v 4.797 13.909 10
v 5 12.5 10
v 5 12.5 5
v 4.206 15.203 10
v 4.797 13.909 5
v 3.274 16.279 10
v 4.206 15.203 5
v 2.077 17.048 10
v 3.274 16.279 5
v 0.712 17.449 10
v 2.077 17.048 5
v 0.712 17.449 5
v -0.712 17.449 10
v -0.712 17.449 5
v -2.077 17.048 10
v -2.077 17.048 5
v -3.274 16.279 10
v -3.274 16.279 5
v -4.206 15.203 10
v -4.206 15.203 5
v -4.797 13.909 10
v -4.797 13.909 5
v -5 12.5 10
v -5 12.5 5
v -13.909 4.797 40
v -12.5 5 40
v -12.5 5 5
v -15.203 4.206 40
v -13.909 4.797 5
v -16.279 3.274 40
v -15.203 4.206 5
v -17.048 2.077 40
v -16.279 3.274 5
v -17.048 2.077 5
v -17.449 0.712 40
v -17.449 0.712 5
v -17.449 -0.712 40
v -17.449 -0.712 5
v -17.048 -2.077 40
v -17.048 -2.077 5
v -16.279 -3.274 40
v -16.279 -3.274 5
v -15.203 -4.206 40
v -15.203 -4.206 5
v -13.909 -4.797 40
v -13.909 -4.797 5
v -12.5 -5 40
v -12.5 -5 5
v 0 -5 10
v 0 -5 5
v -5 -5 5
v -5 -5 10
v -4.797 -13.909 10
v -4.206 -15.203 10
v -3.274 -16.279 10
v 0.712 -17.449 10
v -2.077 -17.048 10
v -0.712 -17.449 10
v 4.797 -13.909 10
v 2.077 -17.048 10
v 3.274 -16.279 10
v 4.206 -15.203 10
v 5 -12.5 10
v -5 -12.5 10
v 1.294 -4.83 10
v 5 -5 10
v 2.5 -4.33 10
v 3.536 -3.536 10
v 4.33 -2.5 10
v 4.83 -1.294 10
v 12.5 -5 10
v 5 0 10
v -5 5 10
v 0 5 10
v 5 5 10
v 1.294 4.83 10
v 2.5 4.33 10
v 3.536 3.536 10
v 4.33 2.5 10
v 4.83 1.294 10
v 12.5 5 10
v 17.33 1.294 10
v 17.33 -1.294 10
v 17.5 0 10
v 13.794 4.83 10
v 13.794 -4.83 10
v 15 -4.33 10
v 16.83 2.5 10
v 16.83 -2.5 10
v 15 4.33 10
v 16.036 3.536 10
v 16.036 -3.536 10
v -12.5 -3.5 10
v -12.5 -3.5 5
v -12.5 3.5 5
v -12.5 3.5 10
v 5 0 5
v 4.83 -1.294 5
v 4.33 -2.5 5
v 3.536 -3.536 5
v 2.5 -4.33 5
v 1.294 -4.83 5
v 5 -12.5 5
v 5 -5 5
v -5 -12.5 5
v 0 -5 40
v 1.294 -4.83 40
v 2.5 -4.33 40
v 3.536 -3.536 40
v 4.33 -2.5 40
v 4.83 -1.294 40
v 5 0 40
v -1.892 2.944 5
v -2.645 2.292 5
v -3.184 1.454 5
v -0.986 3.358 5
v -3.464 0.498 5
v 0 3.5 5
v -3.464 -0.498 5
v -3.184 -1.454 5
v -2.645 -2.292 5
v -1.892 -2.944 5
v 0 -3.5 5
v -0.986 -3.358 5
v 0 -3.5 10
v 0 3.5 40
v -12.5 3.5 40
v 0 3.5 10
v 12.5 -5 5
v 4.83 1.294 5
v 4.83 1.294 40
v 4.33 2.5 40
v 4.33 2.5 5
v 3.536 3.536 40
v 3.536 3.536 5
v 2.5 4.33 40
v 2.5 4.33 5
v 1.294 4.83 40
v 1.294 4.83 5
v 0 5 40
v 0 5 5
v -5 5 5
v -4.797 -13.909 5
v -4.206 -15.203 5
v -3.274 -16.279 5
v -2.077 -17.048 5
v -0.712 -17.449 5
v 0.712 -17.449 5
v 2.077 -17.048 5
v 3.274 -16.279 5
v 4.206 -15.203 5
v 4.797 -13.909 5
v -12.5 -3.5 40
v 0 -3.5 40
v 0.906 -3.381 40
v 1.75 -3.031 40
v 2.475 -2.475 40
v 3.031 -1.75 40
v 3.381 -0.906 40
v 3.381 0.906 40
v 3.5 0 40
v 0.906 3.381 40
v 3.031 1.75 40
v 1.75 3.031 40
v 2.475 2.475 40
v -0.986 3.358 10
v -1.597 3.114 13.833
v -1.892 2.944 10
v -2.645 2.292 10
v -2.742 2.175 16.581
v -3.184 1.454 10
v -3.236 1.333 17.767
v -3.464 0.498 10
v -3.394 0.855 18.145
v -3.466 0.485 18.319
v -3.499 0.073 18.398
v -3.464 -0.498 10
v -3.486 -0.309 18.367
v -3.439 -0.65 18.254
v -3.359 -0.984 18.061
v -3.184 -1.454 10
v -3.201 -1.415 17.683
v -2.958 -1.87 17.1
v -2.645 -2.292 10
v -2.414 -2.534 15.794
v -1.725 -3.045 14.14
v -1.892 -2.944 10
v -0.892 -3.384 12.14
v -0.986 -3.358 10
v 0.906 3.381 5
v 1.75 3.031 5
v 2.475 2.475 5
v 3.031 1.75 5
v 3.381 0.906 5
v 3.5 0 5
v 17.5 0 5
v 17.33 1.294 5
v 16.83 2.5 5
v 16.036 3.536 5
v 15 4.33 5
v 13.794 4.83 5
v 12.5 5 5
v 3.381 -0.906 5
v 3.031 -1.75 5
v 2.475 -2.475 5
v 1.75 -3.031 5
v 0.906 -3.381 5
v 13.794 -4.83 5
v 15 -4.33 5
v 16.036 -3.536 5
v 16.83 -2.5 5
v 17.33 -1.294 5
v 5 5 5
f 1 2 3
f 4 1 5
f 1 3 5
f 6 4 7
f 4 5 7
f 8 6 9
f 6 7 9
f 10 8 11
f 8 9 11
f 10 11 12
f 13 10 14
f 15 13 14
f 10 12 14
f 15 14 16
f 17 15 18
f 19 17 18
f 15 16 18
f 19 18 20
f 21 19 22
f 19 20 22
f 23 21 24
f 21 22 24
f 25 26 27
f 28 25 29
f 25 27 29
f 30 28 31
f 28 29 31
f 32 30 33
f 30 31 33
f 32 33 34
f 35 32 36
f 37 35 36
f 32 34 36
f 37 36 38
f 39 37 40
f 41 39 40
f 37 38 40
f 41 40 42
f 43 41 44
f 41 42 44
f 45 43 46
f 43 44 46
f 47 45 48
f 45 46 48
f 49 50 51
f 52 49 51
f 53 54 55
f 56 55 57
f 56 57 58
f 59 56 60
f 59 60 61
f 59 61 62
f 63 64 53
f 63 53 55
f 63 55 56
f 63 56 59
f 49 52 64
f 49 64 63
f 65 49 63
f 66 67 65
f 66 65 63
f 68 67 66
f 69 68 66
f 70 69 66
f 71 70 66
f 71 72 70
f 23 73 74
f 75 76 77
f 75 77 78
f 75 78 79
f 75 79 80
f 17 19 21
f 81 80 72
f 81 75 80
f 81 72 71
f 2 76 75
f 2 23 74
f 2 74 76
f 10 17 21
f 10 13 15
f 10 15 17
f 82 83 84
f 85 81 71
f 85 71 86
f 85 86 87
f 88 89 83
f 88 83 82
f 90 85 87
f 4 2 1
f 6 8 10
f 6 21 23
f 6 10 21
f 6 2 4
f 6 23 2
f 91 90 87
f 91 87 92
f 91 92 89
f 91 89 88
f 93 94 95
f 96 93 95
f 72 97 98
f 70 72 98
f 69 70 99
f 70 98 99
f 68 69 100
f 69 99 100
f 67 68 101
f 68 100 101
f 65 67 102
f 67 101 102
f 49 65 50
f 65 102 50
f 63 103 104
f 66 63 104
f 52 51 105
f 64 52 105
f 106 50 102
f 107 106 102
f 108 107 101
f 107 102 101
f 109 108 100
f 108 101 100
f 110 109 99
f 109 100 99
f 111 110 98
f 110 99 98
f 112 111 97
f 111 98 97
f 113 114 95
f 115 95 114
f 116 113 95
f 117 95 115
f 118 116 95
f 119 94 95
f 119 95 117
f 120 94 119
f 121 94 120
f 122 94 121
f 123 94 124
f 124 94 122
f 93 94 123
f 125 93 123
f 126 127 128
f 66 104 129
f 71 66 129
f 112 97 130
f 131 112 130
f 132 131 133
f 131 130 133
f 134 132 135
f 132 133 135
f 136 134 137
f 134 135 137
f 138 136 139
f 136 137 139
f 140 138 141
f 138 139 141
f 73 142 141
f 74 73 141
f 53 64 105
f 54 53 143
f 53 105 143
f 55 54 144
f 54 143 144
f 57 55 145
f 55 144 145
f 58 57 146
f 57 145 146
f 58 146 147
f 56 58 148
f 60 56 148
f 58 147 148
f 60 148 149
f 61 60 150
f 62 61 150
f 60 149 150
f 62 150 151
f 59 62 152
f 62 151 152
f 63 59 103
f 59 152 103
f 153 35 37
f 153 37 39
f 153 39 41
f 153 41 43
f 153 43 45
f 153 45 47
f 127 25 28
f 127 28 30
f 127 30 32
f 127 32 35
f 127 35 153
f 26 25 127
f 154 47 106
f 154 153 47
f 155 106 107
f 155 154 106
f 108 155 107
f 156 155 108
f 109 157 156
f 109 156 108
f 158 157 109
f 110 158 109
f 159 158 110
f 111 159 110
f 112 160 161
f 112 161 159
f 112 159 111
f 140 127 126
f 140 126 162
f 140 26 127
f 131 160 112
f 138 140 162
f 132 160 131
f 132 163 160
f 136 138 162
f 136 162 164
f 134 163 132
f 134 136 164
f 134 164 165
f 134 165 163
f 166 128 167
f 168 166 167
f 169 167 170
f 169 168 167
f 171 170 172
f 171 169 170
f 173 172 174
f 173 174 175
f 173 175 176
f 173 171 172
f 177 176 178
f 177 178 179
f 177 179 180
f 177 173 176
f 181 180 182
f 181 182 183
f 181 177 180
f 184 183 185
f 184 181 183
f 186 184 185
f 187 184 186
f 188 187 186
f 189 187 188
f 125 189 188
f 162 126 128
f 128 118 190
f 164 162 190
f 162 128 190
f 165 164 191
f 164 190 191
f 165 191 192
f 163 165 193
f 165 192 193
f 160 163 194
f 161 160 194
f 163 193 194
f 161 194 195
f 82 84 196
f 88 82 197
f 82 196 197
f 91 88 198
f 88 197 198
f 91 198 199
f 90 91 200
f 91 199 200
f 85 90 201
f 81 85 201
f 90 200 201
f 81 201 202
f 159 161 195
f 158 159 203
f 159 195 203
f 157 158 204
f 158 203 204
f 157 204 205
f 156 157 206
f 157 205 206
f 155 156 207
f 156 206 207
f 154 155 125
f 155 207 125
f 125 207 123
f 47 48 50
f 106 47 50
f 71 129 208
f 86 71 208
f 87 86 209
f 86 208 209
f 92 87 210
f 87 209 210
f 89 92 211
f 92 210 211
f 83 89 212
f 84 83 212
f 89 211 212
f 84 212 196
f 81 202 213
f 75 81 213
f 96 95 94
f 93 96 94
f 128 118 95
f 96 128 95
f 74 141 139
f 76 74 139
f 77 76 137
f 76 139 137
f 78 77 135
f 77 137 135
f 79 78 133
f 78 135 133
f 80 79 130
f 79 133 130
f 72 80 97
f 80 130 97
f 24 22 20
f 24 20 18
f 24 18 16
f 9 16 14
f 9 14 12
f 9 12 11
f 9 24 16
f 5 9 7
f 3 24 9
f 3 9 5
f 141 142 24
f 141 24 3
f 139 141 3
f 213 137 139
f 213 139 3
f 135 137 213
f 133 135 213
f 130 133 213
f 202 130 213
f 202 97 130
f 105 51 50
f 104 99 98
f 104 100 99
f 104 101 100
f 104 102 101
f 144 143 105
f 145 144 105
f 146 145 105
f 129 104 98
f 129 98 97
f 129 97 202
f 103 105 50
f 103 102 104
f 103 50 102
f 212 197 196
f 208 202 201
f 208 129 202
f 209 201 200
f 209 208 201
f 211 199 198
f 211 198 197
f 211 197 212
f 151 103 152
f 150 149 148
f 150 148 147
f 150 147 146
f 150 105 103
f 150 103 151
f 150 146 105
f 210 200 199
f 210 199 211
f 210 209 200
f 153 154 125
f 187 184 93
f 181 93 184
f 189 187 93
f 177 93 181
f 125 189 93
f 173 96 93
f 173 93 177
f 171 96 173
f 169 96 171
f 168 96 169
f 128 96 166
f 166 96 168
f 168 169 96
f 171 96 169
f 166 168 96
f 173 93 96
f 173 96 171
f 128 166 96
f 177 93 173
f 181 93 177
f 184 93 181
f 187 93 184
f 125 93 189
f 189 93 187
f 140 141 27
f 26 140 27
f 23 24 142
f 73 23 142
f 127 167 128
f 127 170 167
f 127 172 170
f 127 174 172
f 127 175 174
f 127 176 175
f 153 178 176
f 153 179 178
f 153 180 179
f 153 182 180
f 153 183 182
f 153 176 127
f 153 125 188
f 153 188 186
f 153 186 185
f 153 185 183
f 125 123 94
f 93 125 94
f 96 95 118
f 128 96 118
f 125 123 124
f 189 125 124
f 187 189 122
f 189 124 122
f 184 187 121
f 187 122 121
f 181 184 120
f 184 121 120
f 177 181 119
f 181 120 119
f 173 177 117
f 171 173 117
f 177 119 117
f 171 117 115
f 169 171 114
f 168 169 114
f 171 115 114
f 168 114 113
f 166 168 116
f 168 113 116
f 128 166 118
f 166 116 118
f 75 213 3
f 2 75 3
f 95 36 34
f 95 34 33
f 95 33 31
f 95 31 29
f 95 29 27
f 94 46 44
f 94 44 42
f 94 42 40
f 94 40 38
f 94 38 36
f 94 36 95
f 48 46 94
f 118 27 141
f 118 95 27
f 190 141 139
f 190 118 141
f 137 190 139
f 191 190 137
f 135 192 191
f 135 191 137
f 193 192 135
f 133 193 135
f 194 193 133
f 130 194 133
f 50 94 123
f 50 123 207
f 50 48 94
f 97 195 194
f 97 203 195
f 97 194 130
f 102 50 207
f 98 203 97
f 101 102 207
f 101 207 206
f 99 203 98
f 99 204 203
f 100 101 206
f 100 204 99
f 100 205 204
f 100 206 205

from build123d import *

# Parameters (mm, degrees)
F2_DEPTH  = 5
F3_DEPTH  = 40
F4_DEPTH  = 10
F5_DEPTH  = 40
F9_DEPTH  = 3
F10_SIZE  = 2
F12_DEPTH = 20


# Not quite as in the source:
# - a feature of the source that left no trace in its solid (it failed there, or was rolled back) is left out


with BuildPart() as f2:
    # F1 (on Front) → F2 (new body, symmetric)
    with BuildSketch(Plane.XZ):
        Polygon((-12.5, 10), (0, 10), (-12.5, 40), align=None)
    extrude(amount=F2_DEPTH, both=True)

    # F0 (on Top) → F3 (join)
    with BuildSketch(Plane.XY):
        with BuildLine():
            ThreePointArc((0, -5), (3.5355339059, -3.5355339059), (5, 0))
            ThreePointArc((5, 0), (3.5355339059, 3.5355339059), (0, 5))
            Line((0, 5), (0, 3.5))
            ThreePointArc((0, 3.5), (2.4748737342, 2.4748737342), (3.5, 0))
            ThreePointArc((3.5, 0), (2.4748737342, -2.4748737342), (0, -3.5))
            Line((0, -3.5), (0, -5))
        make_face()
        with BuildLine():
            Line((0, 3.5), (0, 5))
            ThreePointArc((0, 5), (-1.9364916731, 4.6097722286), (-3.5707142143, 3.5))
            Line((-3.5707142143, 3.5), (0, 3.5))
        make_face()
        with BuildLine():
            ThreePointArc((-3.5707142143, 3.5), (-1.9364916731, 4.6097722286), (0, 5))
            Line((0, 5), (-5, 5))
            Line((-5, 5), (-5, 3.5))
            Line((-5, 3.5), (-3.5707142143, 3.5))
        make_face()
        with BuildLine():
            Line((-5, 3.5), (-5, 5))
            Line((-5, 5), (-11.4564392374, 5))
            ThreePointArc((-11.4564392374, 5), (-11.4783307541, 4.9495376652), (-11.5, 4.8989794856))
            ThreePointArc((-11.5, 4.8989794856), (-10.1099910027, 4.3917942794), (-8.9292857857, 3.5))
            Line((-8.9292857857, 3.5), (-5, 3.5))
        make_face()
        with BuildLine():
            Line((-12, 3.5), (-8.9292857857, 3.5))
            ThreePointArc((-8.9292857857, 3.5), (-10.1099910027, 4.3917942794), (-11.5, 4.8989794856))
            ThreePointArc((-11.5, 4.8989794856), (-11.7708022624, 4.2069245417), (-12, 3.5))
        make_face()
        with BuildLine():
            ThreePointArc((-12, 3.5), (-11.7708022624, 4.2069245417), (-11.5, 4.8989794856))
            ThreePointArc((-11.5, 4.8989794856), (-11.99745519, 4.974680765), (-12.5, 5))
            Line((-12.5, 5), (-12.5, 3.5))
            Line((-12.5, 3.5), (-12, 3.5))
        make_face()
        with BuildLine():
            ThreePointArc((-12.5, -5), (-11.99745519, -4.974680765), (-11.5, -4.8989794856))
            ThreePointArc((-11.5, -4.8989794856), (-11.7708022624, -4.2069245417), (-12, -3.5))
            Line((-12, -3.5), (-12.5, -3.5))
            Line((-12.5, -3.5), (-12.5, -5))
        make_face()
        with BuildLine():
            ThreePointArc((-11.5, -4.8989794856), (-10.1099910027, -4.3917942794), (-8.9292857857, -3.5))
            Line((-8.9292857857, -3.5), (-12, -3.5))
            ThreePointArc((-12, -3.5), (-11.7708022624, -4.2069245417), (-11.5, -4.8989794856))
        make_face()
        with BuildLine():
            Line((-11.4564392374, -5), (-5, -5))
            Line((-5, -5), (-5, -3.5))
            Line((-5, -3.5), (-8.9292857857, -3.5))
            ThreePointArc((-8.9292857857, -3.5), (-10.1099910027, -4.3917942794), (-11.5, -4.8989794856))
            ThreePointArc((-11.5, -4.8989794856), (-11.4783307541, -4.9495376652), (-11.4564392374, -5))
        make_face()
        with BuildLine():
            Line((-5, -5), (0, -5))
            ThreePointArc((0, -5), (-1.9364916731, -4.6097722286), (-3.5707142143, -3.5))
            Line((-3.5707142143, -3.5), (-5, -3.5))
            Line((-5, -3.5), (-5, -5))
        make_face()
        with BuildLine():
            ThreePointArc((-3.5707142143, -3.5), (-1.9364916731, -4.6097722286), (0, -5))
            Line((0, -5), (0, -3.5))
            Line((0, -3.5), (-3.5707142143, -3.5))
        make_face()
        with BuildLine():
            Line((-12.5, -5), (-11.4564392374, -5))
            ThreePointArc((-11.4564392374, -5), (-11.4783307541, -4.9495376652), (-11.5, -4.8989794856))
            ThreePointArc((-11.5, -4.8989794856), (-11.99745519, -4.974680765), (-12.5, -5))
        make_face()
        with BuildLine():
            ThreePointArc((-11.5, 4.8989794856), (-11.4783307541, 4.9495376652), (-11.4564392374, 5))
            Line((-11.4564392374, 5), (-12.5, 5))
            ThreePointArc((-12.5, 5), (-11.99745519, 4.974680765), (-11.5, 4.8989794856))
        make_face()
        with BuildLine():
            Line((-12.5, 0), (-12.5, 3))
            ThreePointArc((-12.5, 3), (-15.5, 0), (-12.5, -3))
            Line((-12.5, -3), (-12.5, 0))
        make_face()
        with BuildLine():
            Line((-12.5, 3.5), (-12.5, 5))
            ThreePointArc((-12.5, 5), (-17.5, 0), (-12.5, -5))
            Line((-12.5, -5), (-12.5, -3.5))
            Line((-12.5, -3.5), (-12.5, -3))
            ThreePointArc((-12.5, -3), (-15.5, 0), (-12.5, 3))
            Line((-12.5, 3), (-12.5, 3.5))
        make_face()
    extrude(amount=F3_DEPTH)

    # F0 (on Top) → F5 (cut)
    with BuildSketch(Plane.XY):
        with BuildLine():
            ThreePointArc((3.5, 0), (2.4748737342, 2.4748737342), (0, 3.5))
            ThreePointArc((0, 3.5), (-3.5, 0), (0, -3.5))
            ThreePointArc((0, -3.5), (2.4748737342, -2.4748737342), (3.5, 0))
        make_face()
    extrude(amount=F5_DEPTH, mode=Mode.SUBTRACT)


with BuildPart() as f4:
    # F0 (on Top) → F4 (new body)
    with BuildSketch(Plane.XY):
        with BuildLine():
            Line((0, 3.5), (-3.5707142143, 3.5))
            ThreePointArc((-3.5707142143, 3.5), (-4.6289075964, 1.8902948088), (-5, 0))
            ThreePointArc((-5, 0), (-4.6289075964, -1.8902948088), (-3.5707142143, -3.5))
            Line((-3.5707142143, -3.5), (0, -3.5))
            ThreePointArc((0, -3.5), (-3.5, 0), (0, 3.5))
        make_face()
        with BuildLine():
            ThreePointArc((-5, 0), (-4.6289075964, 1.8902948088), (-3.5707142143, 3.5))
            Line((-3.5707142143, 3.5), (-5, 3.5))
            Line((-5, 3.5), (-5, 0))
        make_face()
        with BuildLine():
            Line((-5, -3.5), (-3.5707142143, -3.5))
            ThreePointArc((-3.5707142143, -3.5), (-4.6289075964, -1.8902948088), (-5, 0))
            Line((-5, 0), (-5, -3.5))
        make_face()
        with BuildLine():
            Line((-5, -3.5), (-5, 0))
            Line((-5, 0), (-5, 3.5))
            Line((-5, 3.5), (-8.9292857857, 3.5))
            ThreePointArc((-8.9292857857, 3.5), (-7.8710924036, 1.8902948088), (-7.5, 0))
            ThreePointArc((-7.5, 0), (-7.8710924036, -1.8902948088), (-8.9292857857, -3.5))
            Line((-8.9292857857, -3.5), (-5, -3.5))
        make_face()
        with BuildLine():
            ThreePointArc((-7.5, 0), (-7.8710924036, 1.8902948088), (-8.9292857857, 3.5))
            Line((-8.9292857857, 3.5), (-12, 3.5))
            ThreePointArc((-12, 3.5), (-12.072818108, 3.239917118), (-12.14, 2.978321675))
            ThreePointArc((-12.14, 2.978321675), (-10.2550055679, 1.9899748742), (-9.5, 0))
            ThreePointArc((-9.5, 0), (-10.2550055679, -1.9899748742), (-12.14, -2.978321675))
            ThreePointArc((-12.14, -2.978321675), (-12.072818108, -3.239917118), (-12, -3.5))
            Line((-12, -3.5), (-8.9292857857, -3.5))
            ThreePointArc((-8.9292857857, -3.5), (-7.8710924036, -1.8902948088), (-7.5, 0))
        make_face()
        with BuildLine():
            ThreePointArc((-9.5, 0), (-10.2550055679, 1.9899748742), (-12.14, 2.978321675))
            ThreePointArc((-12.14, 2.978321675), (-12.409673646, 1.5), (-12.5, 0))
            ThreePointArc((-12.5, 0), (-12.409673646, -1.5), (-12.14, -2.978321675))
            ThreePointArc((-12.14, -2.978321675), (-10.2550055679, -1.9899748742), (-9.5, 0))
        make_face()
        with BuildLine():
            ThreePointArc((-12.5, 0), (-12.409673646, 1.5), (-12.14, 2.978321675))
            ThreePointArc((-12.14, 2.978321675), (-12.3196739413, 2.9945755146), (-12.5, 3))
            Line((-12.5, 3), (-12.5, 0))
        make_face()
        with BuildLine():
            ThreePointArc((-12.5, -3), (-12.3196739413, -2.9945755146), (-12.14, -2.978321675))
            ThreePointArc((-12.14, -2.978321675), (-12.409673646, -1.5), (-12.5, 0))
            Line((-12.5, 0), (-12.5, -3))
        make_face()
        with BuildLine():
            Line((-12.5, -3.5), (-12, -3.5))
            ThreePointArc((-12, -3.5), (-12.072818108, -3.239917118), (-12.14, -2.978321675))
            ThreePointArc((-12.14, -2.978321675), (-12.3196739413, -2.9945755146), (-12.5, -3))
            Line((-12.5, -3), (-12.5, -3.5))
        make_face()
        with BuildLine():
            ThreePointArc((-12.14, 2.978321675), (-12.072818108, 3.239917118), (-12, 3.5))
            Line((-12, 3.5), (-12.5, 3.5))
            Line((-12.5, 3.5), (-12.5, 3))
            ThreePointArc((-12.5, 3), (-12.3196739413, 2.9945755146), (-12.14, 2.978321675))
        make_face()
    extrude(amount=F4_DEPTH)


with BuildPart() as f4b:
    # F0 (on Top) → F4, piece 2 (new body)
    with BuildSketch(Plane.XY):
        with BuildLine():
            Line((5, 5), (5, 11.4564392374))
            ThreePointArc((5, 11.4564392374), (4.9495376652, 11.4783307541), (4.8989794856, 11.5))
            ThreePointArc((4.8989794856, 11.5), (0, 7.5), (-4.8989794856, 11.5))
            ThreePointArc((-4.8989794856, 11.5), (-4.9495376652, 11.4783307541), (-5, 11.4564392374))
            Line((-5, 11.4564392374), (-5, 5))
            Line((-5, 5), (0, 5))
            Line((0, 5), (5, 5))
        make_face()
        with BuildLine():
            ThreePointArc((-4.8989794856, 11.5), (0, 7.5), (4.8989794856, 11.5))
            ThreePointArc((4.8989794856, 11.5), (3.9516285749, 11.8589473229), (2.978321675, 12.14))
            ThreePointArc((2.978321675, 12.14), (0, 9.5), (-2.978321675, 12.14))
            ThreePointArc((-2.978321675, 12.14), (-3.9516285749, 11.8589473229), (-4.8989794856, 11.5))
        make_face()
        with BuildLine():
            ThreePointArc((-2.978321675, 12.14), (0, 9.5), (2.978321675, 12.14))
            ThreePointArc((2.978321675, 12.14), (1.5, 12.409673646), (0, 12.5))
            ThreePointArc((0, 12.5), (-1.5, 12.409673646), (-2.978321675, 12.14))
        make_face()
        with BuildLine():
            ThreePointArc((0, 12.5), (1.5, 12.409673646), (2.978321675, 12.14))
            ThreePointArc((2.978321675, 12.14), (2.9945755146, 12.3196739413), (3, 12.5))
            Line((3, 12.5), (0, 12.5))
        make_face()
        with BuildLine():
            ThreePointArc((2.978321675, 12.14), (3.9516285749, 11.8589473229), (4.8989794856, 11.5))
            ThreePointArc((4.8989794856, 11.5), (4.974680765, 11.99745519), (5, 12.5))
            Line((5, 12.5), (3, 12.5))
            ThreePointArc((3, 12.5), (2.9945755146, 12.3196739413), (2.978321675, 12.14))
        make_face()
        with BuildLine():
            Line((3, 12.5), (5, 12.5))
            ThreePointArc((5, 12.5), (0, 17.5), (-5, 12.5))
            Line((-5, 12.5), (-3, 12.5))
            ThreePointArc((-3, 12.5), (0, 15.5), (3, 12.5))
        make_face()
        with BuildLine():
            Line((0, 12.5), (3, 12.5))
            ThreePointArc((3, 12.5), (0, 15.5), (-3, 12.5))
            Line((-3, 12.5), (0, 12.5))
        make_face()
        with BuildLine():
            ThreePointArc((-2.978321675, 12.14), (-1.5, 12.409673646), (0, 12.5))
            Line((0, 12.5), (-3, 12.5))
            ThreePointArc((-3, 12.5), (-2.9945755146, 12.3196739413), (-2.978321675, 12.14))
        make_face()
        with BuildLine():
            ThreePointArc((-5, 12.5), (-4.974680765, 11.99745519), (-4.8989794856, 11.5))
            ThreePointArc((-4.8989794856, 11.5), (-3.9516285749, 11.8589473229), (-2.978321675, 12.14))
            ThreePointArc((-2.978321675, 12.14), (-2.9945755146, 12.3196739413), (-3, 12.5))
            Line((-3, 12.5), (-5, 12.5))
        make_face()
        with BuildLine():
            ThreePointArc((12.14, -2.978321675), (9.5, 0), (12.14, 2.978321675))
            ThreePointArc((12.14, 2.978321675), (11.8589473229, 3.9516285749), (11.5, 4.8989794856))
            ThreePointArc((11.5, 4.8989794856), (7.5, 0), (11.5, -4.8989794856))
            ThreePointArc((11.5, -4.8989794856), (11.8589473229, -3.9516285749), (12.14, -2.978321675))
        make_face()
        with BuildLine():
            ThreePointArc((11.5, 4.8989794856), (11.8589473229, 3.9516285749), (12.14, 2.978321675))
            ThreePointArc((12.14, 2.978321675), (12.3196739413, 2.9945755146), (12.5, 3))
            Line((12.5, 3), (12.5, 5))
            ThreePointArc((12.5, 5), (11.99745519, 4.974680765), (11.5, 4.8989794856))
        make_face()
        with BuildLine():
            Line((12.5, 5), (12.5, 3))
            ThreePointArc((12.5, 3), (14.6213203436, 2.1213203436), (15.5, 0))
            ThreePointArc((15.5, 0), (14.6213203436, -2.1213203436), (12.5, -3))
            Line((12.5, -3), (12.5, -5))
            ThreePointArc((12.5, -5), (16.0355339059, -3.5355339059), (17.5, 0))
            ThreePointArc((17.5, 0), (16.0355339059, 3.5355339059), (12.5, 5))
        make_face()
        with BuildLine():
            Line((12.5, 3), (12.5, 0))
            Line((12.5, 0), (12.5, -3))
            ThreePointArc((12.5, -3), (14.6213203436, -2.1213203436), (15.5, 0))
            ThreePointArc((15.5, 0), (14.6213203436, 2.1213203436), (12.5, 3))
        make_face()
        with BuildLine():
            ThreePointArc((12.14, -2.978321675), (12.409673646, -1.5), (12.5, 0))
            ThreePointArc((12.5, 0), (12.409673646, 1.5), (12.14, 2.978321675))
            ThreePointArc((12.14, 2.978321675), (9.5, 0), (12.14, -2.978321675))
        make_face()
        with BuildLine():
            ThreePointArc((12.14, 2.978321675), (12.409673646, 1.5), (12.5, 0))
            Line((12.5, 0), (12.5, 3))
            ThreePointArc((12.5, 3), (12.3196739413, 2.9945755146), (12.14, 2.978321675))
        make_face()
        with BuildLine():
            Line((12.5, -3), (12.5, 0))
            ThreePointArc((12.5, 0), (12.409673646, -1.5), (12.14, -2.978321675))
            ThreePointArc((12.14, -2.978321675), (12.3196739413, -2.9945755146), (12.5, -3))
        make_face()
        with BuildLine():
            ThreePointArc((12.5, -3), (12.3196739413, -2.9945755146), (12.14, -2.978321675))
            ThreePointArc((12.14, -2.978321675), (11.8589473229, -3.9516285749), (11.5, -4.8989794856))
            ThreePointArc((11.5, -4.8989794856), (11.99745519, -4.974680765), (12.5, -5))
            Line((12.5, -5), (12.5, -3))
        make_face()
        with BuildLine():
            ThreePointArc((11.5, -4.8989794856), (7.5, 0), (11.5, 4.8989794856))
            ThreePointArc((11.5, 4.8989794856), (11.4783307541, 4.9495376652), (11.4564392374, 5))
            Line((11.4564392374, 5), (5, 5))
            Line((5, 5), (5, 0))
            Line((5, 0), (5, -5))
            Line((5, -5), (11.4564392374, -5))
            ThreePointArc((11.4564392374, -5), (11.4783307541, -4.9495376652), (11.5, -4.8989794856))
        make_face()
        with BuildLine():
            ThreePointArc((4.8989794856, 11.5), (4.9495376652, 11.4783307541), (5, 11.4564392374))
            Line((5, 11.4564392374), (5, 12.5))
            ThreePointArc((5, 12.5), (4.974680765, 11.99745519), (4.8989794856, 11.5))
        make_face()
        with BuildLine():
            ThreePointArc((-5, 11.4564392374), (-4.9495376652, 11.4783307541), (-4.8989794856, 11.5))
            ThreePointArc((-4.8989794856, 11.5), (-4.974680765, 11.99745519), (-5, 12.5))
            Line((-5, 12.5), (-5, 11.4564392374))
        make_face()
        with BuildLine():
            ThreePointArc((11.4564392374, 5), (11.4783307541, 4.9495376652), (11.5, 4.8989794856))
            ThreePointArc((11.5, 4.8989794856), (11.99745519, 4.974680765), (12.5, 5))
            Line((12.5, 5), (11.4564392374, 5))
        make_face()
        with BuildLine():
            ThreePointArc((12.5, -5), (11.99745519, -4.974680765), (11.5, -4.8989794856))
            ThreePointArc((11.5, -4.8989794856), (11.4783307541, -4.9495376652), (11.4564392374, -5))
            Line((11.4564392374, -5), (12.5, -5))
        make_face()
        with BuildLine():
            ThreePointArc((-5, -12.5), (0, -17.5), (5, -12.5))
            Line((5, -12.5), (3, -12.5))
            ThreePointArc((3, -12.5), (0, -15.5), (-3, -12.5))
            Line((-3, -12.5), (-5, -12.5))
        make_face()
        with BuildLine():
            ThreePointArc((3, -12.5), (2.9945755146, -12.3196739413), (2.978321675, -12.14))
            ThreePointArc((2.978321675, -12.14), (1.5, -12.409673646), (0, -12.5))
            Line((0, -12.5), (3, -12.5))
        make_face()
        with BuildLine():
            ThreePointArc((5, -12.5), (4.974680765, -11.99745519), (4.8989794856, -11.5))
            ThreePointArc((4.8989794856, -11.5), (3.9516285749, -11.8589473229), (2.978321675, -12.14))
            ThreePointArc((2.978321675, -12.14), (2.9945755146, -12.3196739413), (3, -12.5))
            Line((3, -12.5), (5, -12.5))
        make_face()
        with BuildLine():
            ThreePointArc((-3, -12.5), (0, -15.5), (3, -12.5))
            Line((3, -12.5), (0, -12.5))
            Line((0, -12.5), (-3, -12.5))
        make_face()
        with BuildLine():
            ThreePointArc((0, -12.5), (1.5, -12.409673646), (2.978321675, -12.14))
            ThreePointArc((2.978321675, -12.14), (0, -9.5), (-2.978321675, -12.14))
            ThreePointArc((-2.978321675, -12.14), (-1.5, -12.409673646), (0, -12.5))
        make_face()
        with BuildLine():
            ThreePointArc((2.978321675, -12.14), (3.9516285749, -11.8589473229), (4.8989794856, -11.5))
            ThreePointArc((4.8989794856, -11.5), (0, -7.5), (-4.8989794856, -11.5))
            ThreePointArc((-4.8989794856, -11.5), (-3.9516285749, -11.8589473229), (-2.978321675, -12.14))
            ThreePointArc((-2.978321675, -12.14), (0, -9.5), (2.978321675, -12.14))
        make_face()
        with BuildLine():
            ThreePointArc((-2.978321675, -12.14), (-3.9516285749, -11.8589473229), (-4.8989794856, -11.5))
            ThreePointArc((-4.8989794856, -11.5), (-4.974680765, -11.99745519), (-5, -12.5))
            Line((-5, -12.5), (-3, -12.5))
            ThreePointArc((-3, -12.5), (-2.9945755146, -12.3196739413), (-2.978321675, -12.14))
        make_face()
        with BuildLine():
            Line((-3, -12.5), (0, -12.5))
            ThreePointArc((0, -12.5), (-1.5, -12.409673646), (-2.978321675, -12.14))
            ThreePointArc((-2.978321675, -12.14), (-2.9945755146, -12.3196739413), (-3, -12.5))
        make_face()
        with BuildLine():
            ThreePointArc((4.8989794856, -11.5), (4.9495376652, -11.4783307541), (5, -11.4564392374))
            Line((5, -11.4564392374), (5, -5))
            Line((5, -5), (0, -5))
            Line((0, -5), (-5, -5))
            Line((-5, -5), (-5, -11.4564392374))
            ThreePointArc((-5, -11.4564392374), (-4.9495376652, -11.4783307541), (-4.8989794856, -11.5))
            ThreePointArc((-4.8989794856, -11.5), (0, -7.5), (4.8989794856, -11.5))
        make_face()
        with BuildLine():
            Line((5, -12.5), (5, -11.4564392374))
            ThreePointArc((5, -11.4564392374), (4.9495376652, -11.4783307541), (4.8989794856, -11.5))
            ThreePointArc((4.8989794856, -11.5), (4.974680765, -11.99745519), (5, -12.5))
        make_face()
        with BuildLine():
            ThreePointArc((-5, -12.5), (-4.974680765, -11.99745519), (-4.8989794856, -11.5))
            ThreePointArc((-4.8989794856, -11.5), (-4.9495376652, -11.4783307541), (-5, -11.4564392374))
            Line((-5, -11.4564392374), (-5, -12.5))
        make_face()
        with BuildLine():
            Line((5, 0), (5, 5))
            Line((5, 5), (0, 5))
            ThreePointArc((0, 5), (3.5355339059, 3.5355339059), (5, 0))
        make_face()
        with BuildLine():
            Line((0, -5), (5, -5))
            Line((5, -5), (5, 0))
            ThreePointArc((5, 0), (3.5355339059, -3.5355339059), (0, -5))
        make_face()
    extrude(amount=F4_DEPTH)

    # F0 (on Top) → F9 (join)
    with BuildSketch(Plane.XY):
        with BuildLine():
            Line((12.5, -3), (12.5, 0))
            ThreePointArc((12.5, 0), (12.409673646, -1.5), (12.14, -2.978321675))
            ThreePointArc((12.14, -2.978321675), (12.3196739413, -2.9945755146), (12.5, -3))
        make_face()
        with BuildLine():
            ThreePointArc((12.14, -2.978321675), (12.409673646, -1.5), (12.5, 0))
            ThreePointArc((12.5, 0), (12.409673646, 1.5), (12.14, 2.978321675))
            ThreePointArc((12.14, 2.978321675), (9.5, 0), (12.14, -2.978321675))
        make_face()
        with BuildLine():
            ThreePointArc((12.14, 2.978321675), (12.409673646, 1.5), (12.5, 0))
            Line((12.5, 0), (12.5, 3))
            ThreePointArc((12.5, 3), (12.3196739413, 2.9945755146), (12.14, 2.978321675))
        make_face()
        with BuildLine():
            Line((12.5, 3), (12.5, 0))
            Line((12.5, 0), (12.5, -3))
            ThreePointArc((12.5, -3), (14.6213203436, -2.1213203436), (15.5, 0))
            ThreePointArc((15.5, 0), (14.6213203436, 2.1213203436), (12.5, 3))
        make_face()
        with BuildLine():
            ThreePointArc((-3, -12.5), (0, -15.5), (3, -12.5))
            Line((3, -12.5), (0, -12.5))
            Line((0, -12.5), (-3, -12.5))
        make_face()
        with BuildLine():
            ThreePointArc((0, -12.5), (1.5, -12.409673646), (2.978321675, -12.14))
            ThreePointArc((2.978321675, -12.14), (0, -9.5), (-2.978321675, -12.14))
            ThreePointArc((-2.978321675, -12.14), (-1.5, -12.409673646), (0, -12.5))
        make_face()
        with BuildLine():
            ThreePointArc((3, -12.5), (2.9945755146, -12.3196739413), (2.978321675, -12.14))
            ThreePointArc((2.978321675, -12.14), (1.5, -12.409673646), (0, -12.5))
            Line((0, -12.5), (3, -12.5))
        make_face()
        with BuildLine():
            Line((-3, -12.5), (0, -12.5))
            ThreePointArc((0, -12.5), (-1.5, -12.409673646), (-2.978321675, -12.14))
            ThreePointArc((-2.978321675, -12.14), (-2.9945755146, -12.3196739413), (-3, -12.5))
        make_face()
    extrude(amount=-F9_DEPTH)

    # F10
    f10_edges = [f4b.edges().sort_by_distance(p)[0] for p in [
        (2.978322, -12.86, -3),
        (12.5, 3, -3),
    ]]
    chamfer(f10_edges, length=F10_SIZE)


with BuildPart() as f12_tool:
    # F11 (on Front) → F12 (new body, symmetric)
    with BuildSketch(Plane.XZ):
        Polygon((19.8633912951, 45), (-19.8633912951, 45), (-19.8633912951, 5), (0, 5), (19.8633912951, 5), align=None)
    extrude(amount=F12_DEPTH, both=True)


with BuildPart() as f2_1:
    add(f2.part)

    # F12: intersect by f12_tool
    add(f12_tool.part, mode=Mode.INTERSECT)


with BuildPart() as f4_1:
    add(f4.part)

    # F12: intersect by f12_tool
    add(f12_tool.part, mode=Mode.INTERSECT)


with BuildPart() as f4b_1:
    add(f4b.part)

    # F12: intersect by f12_tool
    add(f12_tool.part, mode=Mode.INTERSECT)


solid = Compound([f2_1.part, f4_1.part, f4b_1.part])
